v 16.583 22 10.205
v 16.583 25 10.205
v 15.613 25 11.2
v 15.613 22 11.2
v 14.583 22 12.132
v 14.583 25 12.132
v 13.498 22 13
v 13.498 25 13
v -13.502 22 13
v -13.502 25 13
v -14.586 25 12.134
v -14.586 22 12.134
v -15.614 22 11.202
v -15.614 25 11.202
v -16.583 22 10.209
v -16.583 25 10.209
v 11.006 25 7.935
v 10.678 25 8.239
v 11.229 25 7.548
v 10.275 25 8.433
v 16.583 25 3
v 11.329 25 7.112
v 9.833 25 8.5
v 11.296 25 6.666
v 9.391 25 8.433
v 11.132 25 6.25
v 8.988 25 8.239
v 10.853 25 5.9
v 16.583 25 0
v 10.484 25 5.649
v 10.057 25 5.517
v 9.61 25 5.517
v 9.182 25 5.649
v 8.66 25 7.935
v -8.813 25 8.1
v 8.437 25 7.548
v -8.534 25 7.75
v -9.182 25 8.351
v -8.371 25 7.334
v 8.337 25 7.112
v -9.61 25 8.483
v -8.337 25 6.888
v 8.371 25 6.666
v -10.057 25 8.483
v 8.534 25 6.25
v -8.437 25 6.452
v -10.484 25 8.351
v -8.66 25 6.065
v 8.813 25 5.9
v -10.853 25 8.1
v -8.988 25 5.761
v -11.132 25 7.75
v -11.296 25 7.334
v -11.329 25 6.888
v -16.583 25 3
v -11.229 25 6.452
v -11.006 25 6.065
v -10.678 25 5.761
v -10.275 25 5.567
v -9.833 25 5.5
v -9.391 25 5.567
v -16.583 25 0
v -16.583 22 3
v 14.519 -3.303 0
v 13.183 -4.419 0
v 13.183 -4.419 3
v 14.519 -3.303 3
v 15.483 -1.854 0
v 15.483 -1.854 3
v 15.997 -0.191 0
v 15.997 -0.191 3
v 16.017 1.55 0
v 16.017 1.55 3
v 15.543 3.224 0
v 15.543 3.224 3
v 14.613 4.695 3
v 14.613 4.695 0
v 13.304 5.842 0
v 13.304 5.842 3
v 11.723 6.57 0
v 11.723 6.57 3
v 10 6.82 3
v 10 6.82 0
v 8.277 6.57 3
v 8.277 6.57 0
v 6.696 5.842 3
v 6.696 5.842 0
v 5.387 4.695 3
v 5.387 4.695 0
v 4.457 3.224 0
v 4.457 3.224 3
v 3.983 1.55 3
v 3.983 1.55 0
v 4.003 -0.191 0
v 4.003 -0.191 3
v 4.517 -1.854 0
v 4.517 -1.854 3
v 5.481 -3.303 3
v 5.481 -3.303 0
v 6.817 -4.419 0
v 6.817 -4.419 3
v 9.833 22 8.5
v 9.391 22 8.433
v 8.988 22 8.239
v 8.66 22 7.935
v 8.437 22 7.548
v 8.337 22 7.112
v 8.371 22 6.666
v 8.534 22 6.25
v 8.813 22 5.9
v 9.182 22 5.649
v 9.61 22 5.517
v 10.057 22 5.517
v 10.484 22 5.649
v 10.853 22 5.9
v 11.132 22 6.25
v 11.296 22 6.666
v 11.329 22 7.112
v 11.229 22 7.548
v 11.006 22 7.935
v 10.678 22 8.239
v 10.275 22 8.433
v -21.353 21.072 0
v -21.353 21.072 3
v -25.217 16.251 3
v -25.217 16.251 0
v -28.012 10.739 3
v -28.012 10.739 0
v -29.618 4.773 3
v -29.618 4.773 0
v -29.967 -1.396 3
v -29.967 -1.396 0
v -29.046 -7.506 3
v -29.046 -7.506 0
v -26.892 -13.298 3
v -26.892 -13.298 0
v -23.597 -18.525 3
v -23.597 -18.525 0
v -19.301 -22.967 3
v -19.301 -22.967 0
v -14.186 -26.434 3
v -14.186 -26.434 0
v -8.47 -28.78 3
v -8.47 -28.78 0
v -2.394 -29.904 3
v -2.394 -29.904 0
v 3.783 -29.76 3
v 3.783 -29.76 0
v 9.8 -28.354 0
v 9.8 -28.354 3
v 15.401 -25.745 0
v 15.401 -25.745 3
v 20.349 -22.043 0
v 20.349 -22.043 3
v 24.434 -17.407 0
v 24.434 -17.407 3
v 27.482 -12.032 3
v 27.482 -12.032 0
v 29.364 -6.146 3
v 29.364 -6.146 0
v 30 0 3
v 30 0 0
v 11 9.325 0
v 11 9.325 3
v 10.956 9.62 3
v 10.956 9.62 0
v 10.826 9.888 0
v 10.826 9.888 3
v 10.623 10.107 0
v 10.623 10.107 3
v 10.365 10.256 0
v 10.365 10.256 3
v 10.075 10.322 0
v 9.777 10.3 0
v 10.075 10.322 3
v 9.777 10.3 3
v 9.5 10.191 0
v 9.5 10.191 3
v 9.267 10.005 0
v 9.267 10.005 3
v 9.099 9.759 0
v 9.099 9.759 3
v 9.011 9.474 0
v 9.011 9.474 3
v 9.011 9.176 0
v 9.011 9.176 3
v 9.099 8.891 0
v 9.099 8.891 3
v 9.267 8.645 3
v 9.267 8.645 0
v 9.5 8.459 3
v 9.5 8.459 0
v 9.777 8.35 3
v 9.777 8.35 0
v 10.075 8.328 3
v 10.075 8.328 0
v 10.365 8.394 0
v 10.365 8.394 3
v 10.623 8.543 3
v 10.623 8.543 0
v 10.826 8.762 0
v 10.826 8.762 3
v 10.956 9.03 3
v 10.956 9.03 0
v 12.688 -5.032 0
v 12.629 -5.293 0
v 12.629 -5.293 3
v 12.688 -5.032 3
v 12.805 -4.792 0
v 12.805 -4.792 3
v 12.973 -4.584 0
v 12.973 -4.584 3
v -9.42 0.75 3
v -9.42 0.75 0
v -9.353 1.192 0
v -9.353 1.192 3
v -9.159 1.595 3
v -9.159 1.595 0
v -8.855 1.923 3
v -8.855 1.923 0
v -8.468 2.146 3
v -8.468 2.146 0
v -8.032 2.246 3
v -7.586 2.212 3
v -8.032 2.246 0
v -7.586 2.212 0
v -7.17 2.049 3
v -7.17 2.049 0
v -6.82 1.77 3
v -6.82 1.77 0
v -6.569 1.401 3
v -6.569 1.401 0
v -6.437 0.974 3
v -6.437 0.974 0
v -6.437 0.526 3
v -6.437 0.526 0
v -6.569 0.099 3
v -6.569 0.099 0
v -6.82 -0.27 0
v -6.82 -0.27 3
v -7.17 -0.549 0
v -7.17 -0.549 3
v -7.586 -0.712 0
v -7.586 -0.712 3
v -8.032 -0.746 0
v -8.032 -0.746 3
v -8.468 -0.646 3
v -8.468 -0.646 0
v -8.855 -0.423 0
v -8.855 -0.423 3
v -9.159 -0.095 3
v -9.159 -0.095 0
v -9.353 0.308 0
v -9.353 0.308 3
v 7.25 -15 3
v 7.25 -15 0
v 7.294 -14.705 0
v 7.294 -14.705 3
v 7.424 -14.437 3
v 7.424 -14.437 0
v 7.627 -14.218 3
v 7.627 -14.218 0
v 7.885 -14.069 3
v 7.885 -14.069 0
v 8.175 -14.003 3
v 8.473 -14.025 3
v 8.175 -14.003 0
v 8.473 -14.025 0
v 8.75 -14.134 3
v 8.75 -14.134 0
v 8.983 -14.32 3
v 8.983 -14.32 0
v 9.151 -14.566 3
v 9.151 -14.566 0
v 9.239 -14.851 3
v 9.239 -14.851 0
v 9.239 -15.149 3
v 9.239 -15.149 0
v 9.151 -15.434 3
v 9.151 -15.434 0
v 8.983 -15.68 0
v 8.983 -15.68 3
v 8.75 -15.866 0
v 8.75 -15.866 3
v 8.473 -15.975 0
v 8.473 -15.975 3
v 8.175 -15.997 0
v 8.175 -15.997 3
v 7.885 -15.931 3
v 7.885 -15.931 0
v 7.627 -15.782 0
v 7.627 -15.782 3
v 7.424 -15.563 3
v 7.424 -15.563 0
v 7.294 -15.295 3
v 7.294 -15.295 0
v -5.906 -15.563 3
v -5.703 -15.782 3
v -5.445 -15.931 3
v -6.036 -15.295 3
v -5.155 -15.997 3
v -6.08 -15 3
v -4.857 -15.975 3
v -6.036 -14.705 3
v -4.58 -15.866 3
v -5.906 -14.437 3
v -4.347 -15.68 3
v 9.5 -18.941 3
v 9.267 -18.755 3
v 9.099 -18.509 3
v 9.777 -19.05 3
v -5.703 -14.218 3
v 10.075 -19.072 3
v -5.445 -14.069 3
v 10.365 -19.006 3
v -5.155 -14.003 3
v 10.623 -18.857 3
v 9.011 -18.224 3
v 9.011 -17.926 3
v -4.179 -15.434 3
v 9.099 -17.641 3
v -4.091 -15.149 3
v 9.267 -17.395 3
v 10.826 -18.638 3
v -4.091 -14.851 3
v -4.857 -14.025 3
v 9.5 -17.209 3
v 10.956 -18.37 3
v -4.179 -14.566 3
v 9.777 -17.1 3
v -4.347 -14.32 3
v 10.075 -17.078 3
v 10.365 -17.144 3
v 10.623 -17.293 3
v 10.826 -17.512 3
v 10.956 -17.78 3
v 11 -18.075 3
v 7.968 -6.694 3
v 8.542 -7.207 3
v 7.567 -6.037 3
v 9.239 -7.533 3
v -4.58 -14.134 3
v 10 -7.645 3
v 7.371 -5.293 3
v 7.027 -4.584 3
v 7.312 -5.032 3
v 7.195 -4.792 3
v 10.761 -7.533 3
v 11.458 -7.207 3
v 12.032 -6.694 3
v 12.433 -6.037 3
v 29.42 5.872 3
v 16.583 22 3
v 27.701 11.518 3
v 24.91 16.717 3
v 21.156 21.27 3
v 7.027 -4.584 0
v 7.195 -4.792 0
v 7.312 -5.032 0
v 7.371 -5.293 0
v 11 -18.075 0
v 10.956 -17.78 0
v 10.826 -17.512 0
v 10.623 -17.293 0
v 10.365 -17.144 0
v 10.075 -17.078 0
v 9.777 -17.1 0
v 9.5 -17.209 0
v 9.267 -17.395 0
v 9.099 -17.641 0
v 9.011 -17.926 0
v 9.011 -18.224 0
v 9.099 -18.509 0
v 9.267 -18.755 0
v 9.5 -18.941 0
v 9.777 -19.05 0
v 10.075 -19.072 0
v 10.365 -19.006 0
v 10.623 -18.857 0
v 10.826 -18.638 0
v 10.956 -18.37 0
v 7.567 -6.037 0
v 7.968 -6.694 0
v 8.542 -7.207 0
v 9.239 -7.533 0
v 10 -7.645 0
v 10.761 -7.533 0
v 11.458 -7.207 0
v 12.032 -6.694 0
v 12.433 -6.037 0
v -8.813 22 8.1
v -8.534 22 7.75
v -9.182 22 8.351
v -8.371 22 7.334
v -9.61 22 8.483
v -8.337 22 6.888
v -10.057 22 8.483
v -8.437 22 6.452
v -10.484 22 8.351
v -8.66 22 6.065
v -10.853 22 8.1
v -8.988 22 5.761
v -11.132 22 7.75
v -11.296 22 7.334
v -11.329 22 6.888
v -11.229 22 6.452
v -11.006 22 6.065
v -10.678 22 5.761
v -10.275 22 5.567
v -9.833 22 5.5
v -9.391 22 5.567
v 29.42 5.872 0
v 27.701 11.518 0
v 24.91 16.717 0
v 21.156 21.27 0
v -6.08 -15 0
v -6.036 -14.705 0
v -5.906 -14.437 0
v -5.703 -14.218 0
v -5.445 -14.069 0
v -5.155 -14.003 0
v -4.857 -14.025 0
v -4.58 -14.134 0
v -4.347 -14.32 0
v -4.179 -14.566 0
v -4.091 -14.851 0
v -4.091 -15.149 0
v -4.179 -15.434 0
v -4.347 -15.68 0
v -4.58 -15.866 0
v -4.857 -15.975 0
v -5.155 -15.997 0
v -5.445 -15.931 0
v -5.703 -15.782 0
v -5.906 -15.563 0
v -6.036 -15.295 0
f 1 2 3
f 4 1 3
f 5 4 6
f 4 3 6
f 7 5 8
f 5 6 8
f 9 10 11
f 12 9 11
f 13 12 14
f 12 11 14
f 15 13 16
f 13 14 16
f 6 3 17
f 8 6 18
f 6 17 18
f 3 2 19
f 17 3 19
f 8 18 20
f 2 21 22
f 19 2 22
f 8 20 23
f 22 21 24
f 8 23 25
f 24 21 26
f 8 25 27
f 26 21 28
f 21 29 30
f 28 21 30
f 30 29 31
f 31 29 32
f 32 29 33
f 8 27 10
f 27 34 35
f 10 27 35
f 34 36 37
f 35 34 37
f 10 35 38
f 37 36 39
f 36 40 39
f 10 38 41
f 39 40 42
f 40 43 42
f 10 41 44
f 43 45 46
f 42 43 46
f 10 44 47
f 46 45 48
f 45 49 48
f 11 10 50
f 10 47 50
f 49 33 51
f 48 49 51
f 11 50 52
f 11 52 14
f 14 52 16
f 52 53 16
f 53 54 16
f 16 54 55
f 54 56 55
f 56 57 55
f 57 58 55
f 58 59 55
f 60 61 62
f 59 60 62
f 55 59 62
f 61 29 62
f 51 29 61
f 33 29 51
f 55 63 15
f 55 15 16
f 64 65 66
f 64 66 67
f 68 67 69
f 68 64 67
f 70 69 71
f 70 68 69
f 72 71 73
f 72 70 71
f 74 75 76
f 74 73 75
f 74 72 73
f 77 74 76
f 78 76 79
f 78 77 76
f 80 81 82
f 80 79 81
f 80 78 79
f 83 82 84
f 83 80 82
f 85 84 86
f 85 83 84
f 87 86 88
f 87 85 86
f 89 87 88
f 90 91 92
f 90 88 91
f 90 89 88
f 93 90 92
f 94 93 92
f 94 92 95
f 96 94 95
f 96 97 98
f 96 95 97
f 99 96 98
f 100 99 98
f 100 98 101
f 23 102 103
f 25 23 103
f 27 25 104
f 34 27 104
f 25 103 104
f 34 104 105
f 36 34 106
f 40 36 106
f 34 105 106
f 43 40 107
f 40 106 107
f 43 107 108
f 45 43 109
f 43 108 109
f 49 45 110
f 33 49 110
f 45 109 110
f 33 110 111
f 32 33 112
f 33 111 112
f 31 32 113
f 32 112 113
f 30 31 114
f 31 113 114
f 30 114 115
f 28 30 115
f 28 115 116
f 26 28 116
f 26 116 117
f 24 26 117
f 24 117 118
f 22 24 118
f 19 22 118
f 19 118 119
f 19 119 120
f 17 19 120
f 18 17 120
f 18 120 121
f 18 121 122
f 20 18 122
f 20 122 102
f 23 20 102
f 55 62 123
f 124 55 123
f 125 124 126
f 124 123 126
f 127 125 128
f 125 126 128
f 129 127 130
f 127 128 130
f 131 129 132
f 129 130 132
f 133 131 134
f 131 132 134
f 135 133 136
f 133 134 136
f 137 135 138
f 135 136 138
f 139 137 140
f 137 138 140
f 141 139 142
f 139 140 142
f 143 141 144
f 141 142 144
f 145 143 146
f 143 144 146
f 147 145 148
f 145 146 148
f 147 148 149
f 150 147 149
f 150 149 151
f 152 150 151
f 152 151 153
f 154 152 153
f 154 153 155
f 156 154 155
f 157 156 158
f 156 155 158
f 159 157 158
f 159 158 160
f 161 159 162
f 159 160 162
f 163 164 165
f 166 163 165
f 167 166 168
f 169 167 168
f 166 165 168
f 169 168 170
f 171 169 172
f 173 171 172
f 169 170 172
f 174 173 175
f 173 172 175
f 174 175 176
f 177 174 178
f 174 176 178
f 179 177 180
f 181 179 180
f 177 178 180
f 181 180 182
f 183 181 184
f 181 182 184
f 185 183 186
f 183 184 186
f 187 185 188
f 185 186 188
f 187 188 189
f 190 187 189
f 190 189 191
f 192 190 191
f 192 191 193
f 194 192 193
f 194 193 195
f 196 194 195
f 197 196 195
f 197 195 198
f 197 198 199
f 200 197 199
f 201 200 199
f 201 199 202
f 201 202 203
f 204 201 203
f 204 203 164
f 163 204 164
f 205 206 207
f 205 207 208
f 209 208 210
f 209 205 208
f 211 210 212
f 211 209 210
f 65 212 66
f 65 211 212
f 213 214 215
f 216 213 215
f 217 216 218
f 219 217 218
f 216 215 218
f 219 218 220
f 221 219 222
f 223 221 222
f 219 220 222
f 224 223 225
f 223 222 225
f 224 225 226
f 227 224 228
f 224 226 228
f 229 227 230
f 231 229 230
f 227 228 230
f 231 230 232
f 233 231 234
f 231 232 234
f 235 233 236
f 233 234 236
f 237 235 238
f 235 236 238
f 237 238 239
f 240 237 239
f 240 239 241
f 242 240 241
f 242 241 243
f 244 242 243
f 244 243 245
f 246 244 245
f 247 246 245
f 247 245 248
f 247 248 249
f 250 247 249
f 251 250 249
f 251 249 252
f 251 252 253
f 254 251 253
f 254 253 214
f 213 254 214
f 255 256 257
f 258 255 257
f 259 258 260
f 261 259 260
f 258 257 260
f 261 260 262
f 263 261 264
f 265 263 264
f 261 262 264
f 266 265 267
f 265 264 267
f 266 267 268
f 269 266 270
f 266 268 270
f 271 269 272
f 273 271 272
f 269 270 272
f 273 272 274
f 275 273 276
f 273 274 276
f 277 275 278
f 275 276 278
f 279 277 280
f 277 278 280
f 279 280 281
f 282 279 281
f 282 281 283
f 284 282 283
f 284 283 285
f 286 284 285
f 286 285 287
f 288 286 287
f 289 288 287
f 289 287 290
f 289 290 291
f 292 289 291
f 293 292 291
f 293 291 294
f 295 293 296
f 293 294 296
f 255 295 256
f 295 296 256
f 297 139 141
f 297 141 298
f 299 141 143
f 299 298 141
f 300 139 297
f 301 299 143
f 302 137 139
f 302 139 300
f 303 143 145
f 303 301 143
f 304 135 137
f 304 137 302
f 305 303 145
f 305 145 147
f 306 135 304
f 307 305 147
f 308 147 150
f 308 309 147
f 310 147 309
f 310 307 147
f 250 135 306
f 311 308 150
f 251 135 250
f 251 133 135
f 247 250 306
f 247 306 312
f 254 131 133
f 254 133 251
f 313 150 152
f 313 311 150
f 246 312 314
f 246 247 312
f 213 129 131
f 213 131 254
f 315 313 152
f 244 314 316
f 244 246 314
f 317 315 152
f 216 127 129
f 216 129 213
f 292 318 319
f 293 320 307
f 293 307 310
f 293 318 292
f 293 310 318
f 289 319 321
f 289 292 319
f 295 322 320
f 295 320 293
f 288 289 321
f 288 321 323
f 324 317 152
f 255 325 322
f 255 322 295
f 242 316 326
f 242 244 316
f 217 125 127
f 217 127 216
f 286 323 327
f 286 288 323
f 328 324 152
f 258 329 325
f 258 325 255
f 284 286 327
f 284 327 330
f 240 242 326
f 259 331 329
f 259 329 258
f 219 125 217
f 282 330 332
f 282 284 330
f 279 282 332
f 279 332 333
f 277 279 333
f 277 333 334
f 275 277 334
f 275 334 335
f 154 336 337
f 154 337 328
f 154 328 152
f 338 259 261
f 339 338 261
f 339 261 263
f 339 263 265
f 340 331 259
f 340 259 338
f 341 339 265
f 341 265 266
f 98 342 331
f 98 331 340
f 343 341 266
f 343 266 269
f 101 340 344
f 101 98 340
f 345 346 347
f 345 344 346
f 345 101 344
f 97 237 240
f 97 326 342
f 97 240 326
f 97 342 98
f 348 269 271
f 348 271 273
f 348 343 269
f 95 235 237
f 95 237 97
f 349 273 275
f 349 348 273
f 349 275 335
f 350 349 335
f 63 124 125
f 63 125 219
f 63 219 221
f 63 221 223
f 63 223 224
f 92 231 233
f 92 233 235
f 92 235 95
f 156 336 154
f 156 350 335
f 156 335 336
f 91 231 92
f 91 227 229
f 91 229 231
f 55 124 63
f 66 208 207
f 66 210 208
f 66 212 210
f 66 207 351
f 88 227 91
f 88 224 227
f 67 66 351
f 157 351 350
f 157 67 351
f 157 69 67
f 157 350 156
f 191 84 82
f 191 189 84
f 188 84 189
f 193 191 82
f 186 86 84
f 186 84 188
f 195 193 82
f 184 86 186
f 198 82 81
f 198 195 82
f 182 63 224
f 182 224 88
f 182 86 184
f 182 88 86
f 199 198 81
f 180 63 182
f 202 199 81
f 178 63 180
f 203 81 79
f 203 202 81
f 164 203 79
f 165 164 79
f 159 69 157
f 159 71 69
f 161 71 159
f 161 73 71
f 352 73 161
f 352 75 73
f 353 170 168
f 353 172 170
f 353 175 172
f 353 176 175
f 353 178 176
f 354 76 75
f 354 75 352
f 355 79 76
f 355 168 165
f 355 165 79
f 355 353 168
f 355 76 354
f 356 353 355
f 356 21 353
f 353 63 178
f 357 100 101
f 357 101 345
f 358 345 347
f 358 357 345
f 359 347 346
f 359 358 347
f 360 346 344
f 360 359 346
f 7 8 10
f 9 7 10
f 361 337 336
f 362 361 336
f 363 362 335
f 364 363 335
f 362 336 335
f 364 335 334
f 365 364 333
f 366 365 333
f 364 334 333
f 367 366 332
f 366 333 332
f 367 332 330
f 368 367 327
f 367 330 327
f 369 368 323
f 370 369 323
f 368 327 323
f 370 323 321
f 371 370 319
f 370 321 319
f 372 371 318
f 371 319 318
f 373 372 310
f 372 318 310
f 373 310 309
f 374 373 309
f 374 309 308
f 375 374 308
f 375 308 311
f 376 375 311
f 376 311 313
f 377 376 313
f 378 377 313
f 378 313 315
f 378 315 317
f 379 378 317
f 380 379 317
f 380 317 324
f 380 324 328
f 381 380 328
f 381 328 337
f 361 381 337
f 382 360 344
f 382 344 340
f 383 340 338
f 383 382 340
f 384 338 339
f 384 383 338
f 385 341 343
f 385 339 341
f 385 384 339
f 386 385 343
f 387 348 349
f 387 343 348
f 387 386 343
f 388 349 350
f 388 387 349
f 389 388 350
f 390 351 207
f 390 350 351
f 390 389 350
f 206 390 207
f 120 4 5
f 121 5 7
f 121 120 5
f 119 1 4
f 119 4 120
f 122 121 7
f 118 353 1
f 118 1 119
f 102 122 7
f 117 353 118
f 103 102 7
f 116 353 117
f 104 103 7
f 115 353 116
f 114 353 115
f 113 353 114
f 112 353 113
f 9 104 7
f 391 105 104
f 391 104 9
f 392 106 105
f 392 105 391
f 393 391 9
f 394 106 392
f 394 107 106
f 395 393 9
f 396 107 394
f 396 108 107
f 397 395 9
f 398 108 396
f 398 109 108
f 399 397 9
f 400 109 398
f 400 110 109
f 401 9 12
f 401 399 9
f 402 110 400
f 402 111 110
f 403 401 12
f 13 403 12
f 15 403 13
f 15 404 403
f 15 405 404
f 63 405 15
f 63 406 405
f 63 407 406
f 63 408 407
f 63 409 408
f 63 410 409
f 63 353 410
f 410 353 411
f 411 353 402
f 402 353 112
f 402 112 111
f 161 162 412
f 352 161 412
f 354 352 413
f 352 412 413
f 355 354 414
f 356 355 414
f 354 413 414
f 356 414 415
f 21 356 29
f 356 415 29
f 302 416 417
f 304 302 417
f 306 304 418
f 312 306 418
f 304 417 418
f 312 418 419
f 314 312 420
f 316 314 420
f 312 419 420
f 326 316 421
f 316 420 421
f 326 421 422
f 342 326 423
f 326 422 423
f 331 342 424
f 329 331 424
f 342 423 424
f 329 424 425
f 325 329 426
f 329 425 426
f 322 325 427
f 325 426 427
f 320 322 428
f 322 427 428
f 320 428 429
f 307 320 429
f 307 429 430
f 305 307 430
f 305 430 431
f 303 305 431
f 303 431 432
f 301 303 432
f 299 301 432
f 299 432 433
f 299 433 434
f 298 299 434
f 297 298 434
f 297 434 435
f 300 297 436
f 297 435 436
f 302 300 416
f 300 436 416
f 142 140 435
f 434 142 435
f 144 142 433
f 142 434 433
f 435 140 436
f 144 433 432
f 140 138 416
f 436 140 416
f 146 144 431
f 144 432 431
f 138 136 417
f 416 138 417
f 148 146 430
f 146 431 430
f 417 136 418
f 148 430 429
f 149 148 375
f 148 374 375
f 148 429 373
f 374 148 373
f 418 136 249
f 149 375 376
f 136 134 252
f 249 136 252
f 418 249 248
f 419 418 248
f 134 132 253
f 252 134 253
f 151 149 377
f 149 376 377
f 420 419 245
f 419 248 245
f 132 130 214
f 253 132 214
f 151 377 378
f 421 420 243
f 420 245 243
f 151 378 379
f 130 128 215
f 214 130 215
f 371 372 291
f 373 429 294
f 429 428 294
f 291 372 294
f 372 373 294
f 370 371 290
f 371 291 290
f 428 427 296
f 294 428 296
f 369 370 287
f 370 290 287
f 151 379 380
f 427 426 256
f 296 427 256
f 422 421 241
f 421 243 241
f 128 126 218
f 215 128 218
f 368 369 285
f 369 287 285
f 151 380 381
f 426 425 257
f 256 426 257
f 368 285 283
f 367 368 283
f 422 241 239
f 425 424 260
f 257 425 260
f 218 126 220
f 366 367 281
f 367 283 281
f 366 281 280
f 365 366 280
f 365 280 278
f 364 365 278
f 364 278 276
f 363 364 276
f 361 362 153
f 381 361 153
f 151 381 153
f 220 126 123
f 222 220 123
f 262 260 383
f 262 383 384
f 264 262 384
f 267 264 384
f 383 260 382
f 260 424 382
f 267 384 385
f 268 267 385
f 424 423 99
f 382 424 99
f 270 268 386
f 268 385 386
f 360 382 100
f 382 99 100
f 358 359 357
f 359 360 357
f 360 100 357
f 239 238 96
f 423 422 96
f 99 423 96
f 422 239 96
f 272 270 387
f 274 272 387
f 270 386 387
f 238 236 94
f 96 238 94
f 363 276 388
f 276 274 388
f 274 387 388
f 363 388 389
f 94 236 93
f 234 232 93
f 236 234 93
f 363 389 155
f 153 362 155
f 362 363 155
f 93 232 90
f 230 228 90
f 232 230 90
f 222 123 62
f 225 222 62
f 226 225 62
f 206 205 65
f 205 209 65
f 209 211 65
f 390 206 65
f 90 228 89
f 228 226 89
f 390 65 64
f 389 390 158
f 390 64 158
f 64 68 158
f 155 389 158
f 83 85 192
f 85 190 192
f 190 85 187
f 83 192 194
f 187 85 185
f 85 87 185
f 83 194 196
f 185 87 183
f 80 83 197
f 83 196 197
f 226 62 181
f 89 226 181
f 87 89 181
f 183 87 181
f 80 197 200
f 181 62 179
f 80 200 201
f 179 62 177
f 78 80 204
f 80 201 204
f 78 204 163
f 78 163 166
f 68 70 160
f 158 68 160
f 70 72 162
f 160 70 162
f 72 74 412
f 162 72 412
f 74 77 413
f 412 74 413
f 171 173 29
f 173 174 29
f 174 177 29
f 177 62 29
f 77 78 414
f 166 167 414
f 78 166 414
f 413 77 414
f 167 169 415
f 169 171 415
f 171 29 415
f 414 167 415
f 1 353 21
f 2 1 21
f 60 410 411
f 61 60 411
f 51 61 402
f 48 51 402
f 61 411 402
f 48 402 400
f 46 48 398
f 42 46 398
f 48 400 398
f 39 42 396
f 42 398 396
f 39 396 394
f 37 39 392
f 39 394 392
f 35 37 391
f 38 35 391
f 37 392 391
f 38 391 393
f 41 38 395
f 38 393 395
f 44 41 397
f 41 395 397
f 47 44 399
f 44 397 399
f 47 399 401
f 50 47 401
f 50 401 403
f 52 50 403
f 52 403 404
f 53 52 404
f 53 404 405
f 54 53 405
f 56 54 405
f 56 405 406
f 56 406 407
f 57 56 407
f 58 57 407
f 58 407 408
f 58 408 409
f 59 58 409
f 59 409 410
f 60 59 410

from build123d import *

# Parameters (mm, degrees)
BOSS_EXTRU_1_DEPTH      = 3
BOSS_EXTRU_2_START      = -3
ESQUISSE2_W             = 33.166247904
ESQUISSE2_H             = 3
BOSS_EXTRU_2_DEPTH      = 10
ENL_V_MAT_EXTRU_1_DEPTH = 10
ESQUISSE4_R             = 1.5
ENL_V_MAT_EXTRU_2_DEPTH = 10
ESQUISSE5_R             = 1
ENL_V_MAT_EXTRU_3_DEPTH = 44.588989435
ENL_V_MAT_EXTRU_4_DEPTH = 45.373415465
ESQUISSE7_R             = 1.5
ENL_V_MAT_EXTRU_5_DEPTH = 45.373415465
ESQUISSE8_R             = 1
ENL_V_MAT_EXTRU_6_DEPTH = 3


with BuildPart() as part:
    # Esquisse1 → Boss.-Extru.1 (new body)
    with BuildSketch(Plane.XY):
        with BuildLine():
            Line((16.583123952, 25), (-16.583123952, 25))
            ThreePointArc((-16.583123952, 25), (-14.186371655, -26.433820369), (30, 0))
            ThreePointArc((30, 0), (26.433820369, 14.186371655), (16.583123952, 25))
        make_face()
    extrude(amount=BOSS_EXTRU_1_DEPTH)

    # Esquisse2 → Boss.-Extru.2 (add)
    with BuildSketch(Plane(origin=(0, 0, 0), x_dir=(-1, 0, 0), z_dir=(0, 0, -1)).offset(BOSS_EXTRU_2_START)):
        with Locations((0, 23.5)):
            Rectangle(ESQUISSE2_W, ESQUISSE2_H)
    extrude(amount=-BOSS_EXTRU_2_DEPTH)

    # Esquisse3 → Enlèv. mat.-Extru.1 (cut)
    with BuildSketch(Plane(origin=(0, 25, 0), x_dir=(1, 0, 0), z_dir=(0, 1, 0))):
        with BuildLine():
            Line((13.498123952, -13), (16.583123952, -13))
            Line((16.583123952, -13), (16.583123952, -10.204860243))
            ThreePointArc((16.583123952, -10.204860243), (15.105407222, -11.673931516), (13.498123952, -13))
        make_face()
        with BuildLine():
            Line((-16.583123952, -10.208951902), (-16.583123952, -13))
            Line((-16.583123952, -13), (-13.501876048, -13))
            ThreePointArc((-13.501876048, -13), (-15.107102171, -11.675795147), (-16.583123952, -10.208951902))
        make_face()
    extrude(amount=-ENL_V_MAT_EXTRU_1_DEPTH, mode=Mode.SUBTRACT)

    # Esquisse4 → Enlèv. mat.-Extru.2 (cut)
    with BuildSketch(Plane.XZ.offset(-22)):
        with Locations(Location((-9.833123952, 7, 0), (0, 0, 270))):
            Circle(ESQUISSE4_R)
        with Locations(Location((9.833123952, 7, 0), (0, 0, 90))):
            Circle(ESQUISSE4_R)
    extrude(amount=-ENL_V_MAT_EXTRU_2_DEPTH, mode=Mode.SUBTRACT)

    # Esquisse5 → Enlèv. mat.-Extru.3 (cut, through all)
    with BuildSketch(Plane.XY.offset(3)):
        with Locations((10, -18.075)):
            Circle(ESQUISSE5_R)
        with Locations((10, 9.325)):
            Circle(ESQUISSE5_R)
    extrude(amount=-ENL_V_MAT_EXTRU_3_DEPTH, mode=Mode.SUBTRACT)

    # Esquisse6 → Enlèv. mat.-Extru.4 (cut, through all)
    with BuildSketch(Plane(origin=(0, 0, 0), x_dir=(-1, 0, 0), z_dir=(0, 0, -1))):
        with BuildLine():
            ThreePointArc((-12.628743756, -5.29279902), (-12.804806967, -4.79174357), (-13.182765939, -4.418645952))
            ThreePointArc((-13.182765939, -4.418645952), (-10, 6.82), (-6.817234061, -4.418645952))
            ThreePointArc((-6.817234061, -4.418645952), (-7.195193033, -4.79174357), (-7.371256244, -5.29279902))
            ThreePointArc((-7.371256244, -5.29279902), (-10, -7.645), (-12.628743756, -5.29279902))
        make_face()
    extrude(amount=-ENL_V_MAT_EXTRU_4_DEPTH, mode=Mode.SUBTRACT)

    # Esquisse7 → Enlèv. mat.-Extru.5 (cut, through all)
    with BuildSketch(Plane(origin=(0, 0, 0), x_dir=(-1, 0, 0), z_dir=(0, 0, -1))):
        with Locations((7.92, 0.75)):
            Circle(ESQUISSE7_R)
    extrude(amount=-ENL_V_MAT_EXTRU_5_DEPTH, mode=Mode.SUBTRACT)

    # Esquisse8 → Enlèv. mat.-Extru.6 (cut)
    with BuildSketch(Plane(origin=(0, 0, 0), x_dir=(-1, 0, 0), z_dir=(0, 0, -1))):
        with Locations((-8.25, -15)):
            Circle(ESQUISSE8_R)
        with Locations((5.08, -15)):
            Circle(ESQUISSE8_R)
    extrude(amount=-ENL_V_MAT_EXTRU_6_DEPTH, mode=Mode.SUBTRACT)


solid = part.part
